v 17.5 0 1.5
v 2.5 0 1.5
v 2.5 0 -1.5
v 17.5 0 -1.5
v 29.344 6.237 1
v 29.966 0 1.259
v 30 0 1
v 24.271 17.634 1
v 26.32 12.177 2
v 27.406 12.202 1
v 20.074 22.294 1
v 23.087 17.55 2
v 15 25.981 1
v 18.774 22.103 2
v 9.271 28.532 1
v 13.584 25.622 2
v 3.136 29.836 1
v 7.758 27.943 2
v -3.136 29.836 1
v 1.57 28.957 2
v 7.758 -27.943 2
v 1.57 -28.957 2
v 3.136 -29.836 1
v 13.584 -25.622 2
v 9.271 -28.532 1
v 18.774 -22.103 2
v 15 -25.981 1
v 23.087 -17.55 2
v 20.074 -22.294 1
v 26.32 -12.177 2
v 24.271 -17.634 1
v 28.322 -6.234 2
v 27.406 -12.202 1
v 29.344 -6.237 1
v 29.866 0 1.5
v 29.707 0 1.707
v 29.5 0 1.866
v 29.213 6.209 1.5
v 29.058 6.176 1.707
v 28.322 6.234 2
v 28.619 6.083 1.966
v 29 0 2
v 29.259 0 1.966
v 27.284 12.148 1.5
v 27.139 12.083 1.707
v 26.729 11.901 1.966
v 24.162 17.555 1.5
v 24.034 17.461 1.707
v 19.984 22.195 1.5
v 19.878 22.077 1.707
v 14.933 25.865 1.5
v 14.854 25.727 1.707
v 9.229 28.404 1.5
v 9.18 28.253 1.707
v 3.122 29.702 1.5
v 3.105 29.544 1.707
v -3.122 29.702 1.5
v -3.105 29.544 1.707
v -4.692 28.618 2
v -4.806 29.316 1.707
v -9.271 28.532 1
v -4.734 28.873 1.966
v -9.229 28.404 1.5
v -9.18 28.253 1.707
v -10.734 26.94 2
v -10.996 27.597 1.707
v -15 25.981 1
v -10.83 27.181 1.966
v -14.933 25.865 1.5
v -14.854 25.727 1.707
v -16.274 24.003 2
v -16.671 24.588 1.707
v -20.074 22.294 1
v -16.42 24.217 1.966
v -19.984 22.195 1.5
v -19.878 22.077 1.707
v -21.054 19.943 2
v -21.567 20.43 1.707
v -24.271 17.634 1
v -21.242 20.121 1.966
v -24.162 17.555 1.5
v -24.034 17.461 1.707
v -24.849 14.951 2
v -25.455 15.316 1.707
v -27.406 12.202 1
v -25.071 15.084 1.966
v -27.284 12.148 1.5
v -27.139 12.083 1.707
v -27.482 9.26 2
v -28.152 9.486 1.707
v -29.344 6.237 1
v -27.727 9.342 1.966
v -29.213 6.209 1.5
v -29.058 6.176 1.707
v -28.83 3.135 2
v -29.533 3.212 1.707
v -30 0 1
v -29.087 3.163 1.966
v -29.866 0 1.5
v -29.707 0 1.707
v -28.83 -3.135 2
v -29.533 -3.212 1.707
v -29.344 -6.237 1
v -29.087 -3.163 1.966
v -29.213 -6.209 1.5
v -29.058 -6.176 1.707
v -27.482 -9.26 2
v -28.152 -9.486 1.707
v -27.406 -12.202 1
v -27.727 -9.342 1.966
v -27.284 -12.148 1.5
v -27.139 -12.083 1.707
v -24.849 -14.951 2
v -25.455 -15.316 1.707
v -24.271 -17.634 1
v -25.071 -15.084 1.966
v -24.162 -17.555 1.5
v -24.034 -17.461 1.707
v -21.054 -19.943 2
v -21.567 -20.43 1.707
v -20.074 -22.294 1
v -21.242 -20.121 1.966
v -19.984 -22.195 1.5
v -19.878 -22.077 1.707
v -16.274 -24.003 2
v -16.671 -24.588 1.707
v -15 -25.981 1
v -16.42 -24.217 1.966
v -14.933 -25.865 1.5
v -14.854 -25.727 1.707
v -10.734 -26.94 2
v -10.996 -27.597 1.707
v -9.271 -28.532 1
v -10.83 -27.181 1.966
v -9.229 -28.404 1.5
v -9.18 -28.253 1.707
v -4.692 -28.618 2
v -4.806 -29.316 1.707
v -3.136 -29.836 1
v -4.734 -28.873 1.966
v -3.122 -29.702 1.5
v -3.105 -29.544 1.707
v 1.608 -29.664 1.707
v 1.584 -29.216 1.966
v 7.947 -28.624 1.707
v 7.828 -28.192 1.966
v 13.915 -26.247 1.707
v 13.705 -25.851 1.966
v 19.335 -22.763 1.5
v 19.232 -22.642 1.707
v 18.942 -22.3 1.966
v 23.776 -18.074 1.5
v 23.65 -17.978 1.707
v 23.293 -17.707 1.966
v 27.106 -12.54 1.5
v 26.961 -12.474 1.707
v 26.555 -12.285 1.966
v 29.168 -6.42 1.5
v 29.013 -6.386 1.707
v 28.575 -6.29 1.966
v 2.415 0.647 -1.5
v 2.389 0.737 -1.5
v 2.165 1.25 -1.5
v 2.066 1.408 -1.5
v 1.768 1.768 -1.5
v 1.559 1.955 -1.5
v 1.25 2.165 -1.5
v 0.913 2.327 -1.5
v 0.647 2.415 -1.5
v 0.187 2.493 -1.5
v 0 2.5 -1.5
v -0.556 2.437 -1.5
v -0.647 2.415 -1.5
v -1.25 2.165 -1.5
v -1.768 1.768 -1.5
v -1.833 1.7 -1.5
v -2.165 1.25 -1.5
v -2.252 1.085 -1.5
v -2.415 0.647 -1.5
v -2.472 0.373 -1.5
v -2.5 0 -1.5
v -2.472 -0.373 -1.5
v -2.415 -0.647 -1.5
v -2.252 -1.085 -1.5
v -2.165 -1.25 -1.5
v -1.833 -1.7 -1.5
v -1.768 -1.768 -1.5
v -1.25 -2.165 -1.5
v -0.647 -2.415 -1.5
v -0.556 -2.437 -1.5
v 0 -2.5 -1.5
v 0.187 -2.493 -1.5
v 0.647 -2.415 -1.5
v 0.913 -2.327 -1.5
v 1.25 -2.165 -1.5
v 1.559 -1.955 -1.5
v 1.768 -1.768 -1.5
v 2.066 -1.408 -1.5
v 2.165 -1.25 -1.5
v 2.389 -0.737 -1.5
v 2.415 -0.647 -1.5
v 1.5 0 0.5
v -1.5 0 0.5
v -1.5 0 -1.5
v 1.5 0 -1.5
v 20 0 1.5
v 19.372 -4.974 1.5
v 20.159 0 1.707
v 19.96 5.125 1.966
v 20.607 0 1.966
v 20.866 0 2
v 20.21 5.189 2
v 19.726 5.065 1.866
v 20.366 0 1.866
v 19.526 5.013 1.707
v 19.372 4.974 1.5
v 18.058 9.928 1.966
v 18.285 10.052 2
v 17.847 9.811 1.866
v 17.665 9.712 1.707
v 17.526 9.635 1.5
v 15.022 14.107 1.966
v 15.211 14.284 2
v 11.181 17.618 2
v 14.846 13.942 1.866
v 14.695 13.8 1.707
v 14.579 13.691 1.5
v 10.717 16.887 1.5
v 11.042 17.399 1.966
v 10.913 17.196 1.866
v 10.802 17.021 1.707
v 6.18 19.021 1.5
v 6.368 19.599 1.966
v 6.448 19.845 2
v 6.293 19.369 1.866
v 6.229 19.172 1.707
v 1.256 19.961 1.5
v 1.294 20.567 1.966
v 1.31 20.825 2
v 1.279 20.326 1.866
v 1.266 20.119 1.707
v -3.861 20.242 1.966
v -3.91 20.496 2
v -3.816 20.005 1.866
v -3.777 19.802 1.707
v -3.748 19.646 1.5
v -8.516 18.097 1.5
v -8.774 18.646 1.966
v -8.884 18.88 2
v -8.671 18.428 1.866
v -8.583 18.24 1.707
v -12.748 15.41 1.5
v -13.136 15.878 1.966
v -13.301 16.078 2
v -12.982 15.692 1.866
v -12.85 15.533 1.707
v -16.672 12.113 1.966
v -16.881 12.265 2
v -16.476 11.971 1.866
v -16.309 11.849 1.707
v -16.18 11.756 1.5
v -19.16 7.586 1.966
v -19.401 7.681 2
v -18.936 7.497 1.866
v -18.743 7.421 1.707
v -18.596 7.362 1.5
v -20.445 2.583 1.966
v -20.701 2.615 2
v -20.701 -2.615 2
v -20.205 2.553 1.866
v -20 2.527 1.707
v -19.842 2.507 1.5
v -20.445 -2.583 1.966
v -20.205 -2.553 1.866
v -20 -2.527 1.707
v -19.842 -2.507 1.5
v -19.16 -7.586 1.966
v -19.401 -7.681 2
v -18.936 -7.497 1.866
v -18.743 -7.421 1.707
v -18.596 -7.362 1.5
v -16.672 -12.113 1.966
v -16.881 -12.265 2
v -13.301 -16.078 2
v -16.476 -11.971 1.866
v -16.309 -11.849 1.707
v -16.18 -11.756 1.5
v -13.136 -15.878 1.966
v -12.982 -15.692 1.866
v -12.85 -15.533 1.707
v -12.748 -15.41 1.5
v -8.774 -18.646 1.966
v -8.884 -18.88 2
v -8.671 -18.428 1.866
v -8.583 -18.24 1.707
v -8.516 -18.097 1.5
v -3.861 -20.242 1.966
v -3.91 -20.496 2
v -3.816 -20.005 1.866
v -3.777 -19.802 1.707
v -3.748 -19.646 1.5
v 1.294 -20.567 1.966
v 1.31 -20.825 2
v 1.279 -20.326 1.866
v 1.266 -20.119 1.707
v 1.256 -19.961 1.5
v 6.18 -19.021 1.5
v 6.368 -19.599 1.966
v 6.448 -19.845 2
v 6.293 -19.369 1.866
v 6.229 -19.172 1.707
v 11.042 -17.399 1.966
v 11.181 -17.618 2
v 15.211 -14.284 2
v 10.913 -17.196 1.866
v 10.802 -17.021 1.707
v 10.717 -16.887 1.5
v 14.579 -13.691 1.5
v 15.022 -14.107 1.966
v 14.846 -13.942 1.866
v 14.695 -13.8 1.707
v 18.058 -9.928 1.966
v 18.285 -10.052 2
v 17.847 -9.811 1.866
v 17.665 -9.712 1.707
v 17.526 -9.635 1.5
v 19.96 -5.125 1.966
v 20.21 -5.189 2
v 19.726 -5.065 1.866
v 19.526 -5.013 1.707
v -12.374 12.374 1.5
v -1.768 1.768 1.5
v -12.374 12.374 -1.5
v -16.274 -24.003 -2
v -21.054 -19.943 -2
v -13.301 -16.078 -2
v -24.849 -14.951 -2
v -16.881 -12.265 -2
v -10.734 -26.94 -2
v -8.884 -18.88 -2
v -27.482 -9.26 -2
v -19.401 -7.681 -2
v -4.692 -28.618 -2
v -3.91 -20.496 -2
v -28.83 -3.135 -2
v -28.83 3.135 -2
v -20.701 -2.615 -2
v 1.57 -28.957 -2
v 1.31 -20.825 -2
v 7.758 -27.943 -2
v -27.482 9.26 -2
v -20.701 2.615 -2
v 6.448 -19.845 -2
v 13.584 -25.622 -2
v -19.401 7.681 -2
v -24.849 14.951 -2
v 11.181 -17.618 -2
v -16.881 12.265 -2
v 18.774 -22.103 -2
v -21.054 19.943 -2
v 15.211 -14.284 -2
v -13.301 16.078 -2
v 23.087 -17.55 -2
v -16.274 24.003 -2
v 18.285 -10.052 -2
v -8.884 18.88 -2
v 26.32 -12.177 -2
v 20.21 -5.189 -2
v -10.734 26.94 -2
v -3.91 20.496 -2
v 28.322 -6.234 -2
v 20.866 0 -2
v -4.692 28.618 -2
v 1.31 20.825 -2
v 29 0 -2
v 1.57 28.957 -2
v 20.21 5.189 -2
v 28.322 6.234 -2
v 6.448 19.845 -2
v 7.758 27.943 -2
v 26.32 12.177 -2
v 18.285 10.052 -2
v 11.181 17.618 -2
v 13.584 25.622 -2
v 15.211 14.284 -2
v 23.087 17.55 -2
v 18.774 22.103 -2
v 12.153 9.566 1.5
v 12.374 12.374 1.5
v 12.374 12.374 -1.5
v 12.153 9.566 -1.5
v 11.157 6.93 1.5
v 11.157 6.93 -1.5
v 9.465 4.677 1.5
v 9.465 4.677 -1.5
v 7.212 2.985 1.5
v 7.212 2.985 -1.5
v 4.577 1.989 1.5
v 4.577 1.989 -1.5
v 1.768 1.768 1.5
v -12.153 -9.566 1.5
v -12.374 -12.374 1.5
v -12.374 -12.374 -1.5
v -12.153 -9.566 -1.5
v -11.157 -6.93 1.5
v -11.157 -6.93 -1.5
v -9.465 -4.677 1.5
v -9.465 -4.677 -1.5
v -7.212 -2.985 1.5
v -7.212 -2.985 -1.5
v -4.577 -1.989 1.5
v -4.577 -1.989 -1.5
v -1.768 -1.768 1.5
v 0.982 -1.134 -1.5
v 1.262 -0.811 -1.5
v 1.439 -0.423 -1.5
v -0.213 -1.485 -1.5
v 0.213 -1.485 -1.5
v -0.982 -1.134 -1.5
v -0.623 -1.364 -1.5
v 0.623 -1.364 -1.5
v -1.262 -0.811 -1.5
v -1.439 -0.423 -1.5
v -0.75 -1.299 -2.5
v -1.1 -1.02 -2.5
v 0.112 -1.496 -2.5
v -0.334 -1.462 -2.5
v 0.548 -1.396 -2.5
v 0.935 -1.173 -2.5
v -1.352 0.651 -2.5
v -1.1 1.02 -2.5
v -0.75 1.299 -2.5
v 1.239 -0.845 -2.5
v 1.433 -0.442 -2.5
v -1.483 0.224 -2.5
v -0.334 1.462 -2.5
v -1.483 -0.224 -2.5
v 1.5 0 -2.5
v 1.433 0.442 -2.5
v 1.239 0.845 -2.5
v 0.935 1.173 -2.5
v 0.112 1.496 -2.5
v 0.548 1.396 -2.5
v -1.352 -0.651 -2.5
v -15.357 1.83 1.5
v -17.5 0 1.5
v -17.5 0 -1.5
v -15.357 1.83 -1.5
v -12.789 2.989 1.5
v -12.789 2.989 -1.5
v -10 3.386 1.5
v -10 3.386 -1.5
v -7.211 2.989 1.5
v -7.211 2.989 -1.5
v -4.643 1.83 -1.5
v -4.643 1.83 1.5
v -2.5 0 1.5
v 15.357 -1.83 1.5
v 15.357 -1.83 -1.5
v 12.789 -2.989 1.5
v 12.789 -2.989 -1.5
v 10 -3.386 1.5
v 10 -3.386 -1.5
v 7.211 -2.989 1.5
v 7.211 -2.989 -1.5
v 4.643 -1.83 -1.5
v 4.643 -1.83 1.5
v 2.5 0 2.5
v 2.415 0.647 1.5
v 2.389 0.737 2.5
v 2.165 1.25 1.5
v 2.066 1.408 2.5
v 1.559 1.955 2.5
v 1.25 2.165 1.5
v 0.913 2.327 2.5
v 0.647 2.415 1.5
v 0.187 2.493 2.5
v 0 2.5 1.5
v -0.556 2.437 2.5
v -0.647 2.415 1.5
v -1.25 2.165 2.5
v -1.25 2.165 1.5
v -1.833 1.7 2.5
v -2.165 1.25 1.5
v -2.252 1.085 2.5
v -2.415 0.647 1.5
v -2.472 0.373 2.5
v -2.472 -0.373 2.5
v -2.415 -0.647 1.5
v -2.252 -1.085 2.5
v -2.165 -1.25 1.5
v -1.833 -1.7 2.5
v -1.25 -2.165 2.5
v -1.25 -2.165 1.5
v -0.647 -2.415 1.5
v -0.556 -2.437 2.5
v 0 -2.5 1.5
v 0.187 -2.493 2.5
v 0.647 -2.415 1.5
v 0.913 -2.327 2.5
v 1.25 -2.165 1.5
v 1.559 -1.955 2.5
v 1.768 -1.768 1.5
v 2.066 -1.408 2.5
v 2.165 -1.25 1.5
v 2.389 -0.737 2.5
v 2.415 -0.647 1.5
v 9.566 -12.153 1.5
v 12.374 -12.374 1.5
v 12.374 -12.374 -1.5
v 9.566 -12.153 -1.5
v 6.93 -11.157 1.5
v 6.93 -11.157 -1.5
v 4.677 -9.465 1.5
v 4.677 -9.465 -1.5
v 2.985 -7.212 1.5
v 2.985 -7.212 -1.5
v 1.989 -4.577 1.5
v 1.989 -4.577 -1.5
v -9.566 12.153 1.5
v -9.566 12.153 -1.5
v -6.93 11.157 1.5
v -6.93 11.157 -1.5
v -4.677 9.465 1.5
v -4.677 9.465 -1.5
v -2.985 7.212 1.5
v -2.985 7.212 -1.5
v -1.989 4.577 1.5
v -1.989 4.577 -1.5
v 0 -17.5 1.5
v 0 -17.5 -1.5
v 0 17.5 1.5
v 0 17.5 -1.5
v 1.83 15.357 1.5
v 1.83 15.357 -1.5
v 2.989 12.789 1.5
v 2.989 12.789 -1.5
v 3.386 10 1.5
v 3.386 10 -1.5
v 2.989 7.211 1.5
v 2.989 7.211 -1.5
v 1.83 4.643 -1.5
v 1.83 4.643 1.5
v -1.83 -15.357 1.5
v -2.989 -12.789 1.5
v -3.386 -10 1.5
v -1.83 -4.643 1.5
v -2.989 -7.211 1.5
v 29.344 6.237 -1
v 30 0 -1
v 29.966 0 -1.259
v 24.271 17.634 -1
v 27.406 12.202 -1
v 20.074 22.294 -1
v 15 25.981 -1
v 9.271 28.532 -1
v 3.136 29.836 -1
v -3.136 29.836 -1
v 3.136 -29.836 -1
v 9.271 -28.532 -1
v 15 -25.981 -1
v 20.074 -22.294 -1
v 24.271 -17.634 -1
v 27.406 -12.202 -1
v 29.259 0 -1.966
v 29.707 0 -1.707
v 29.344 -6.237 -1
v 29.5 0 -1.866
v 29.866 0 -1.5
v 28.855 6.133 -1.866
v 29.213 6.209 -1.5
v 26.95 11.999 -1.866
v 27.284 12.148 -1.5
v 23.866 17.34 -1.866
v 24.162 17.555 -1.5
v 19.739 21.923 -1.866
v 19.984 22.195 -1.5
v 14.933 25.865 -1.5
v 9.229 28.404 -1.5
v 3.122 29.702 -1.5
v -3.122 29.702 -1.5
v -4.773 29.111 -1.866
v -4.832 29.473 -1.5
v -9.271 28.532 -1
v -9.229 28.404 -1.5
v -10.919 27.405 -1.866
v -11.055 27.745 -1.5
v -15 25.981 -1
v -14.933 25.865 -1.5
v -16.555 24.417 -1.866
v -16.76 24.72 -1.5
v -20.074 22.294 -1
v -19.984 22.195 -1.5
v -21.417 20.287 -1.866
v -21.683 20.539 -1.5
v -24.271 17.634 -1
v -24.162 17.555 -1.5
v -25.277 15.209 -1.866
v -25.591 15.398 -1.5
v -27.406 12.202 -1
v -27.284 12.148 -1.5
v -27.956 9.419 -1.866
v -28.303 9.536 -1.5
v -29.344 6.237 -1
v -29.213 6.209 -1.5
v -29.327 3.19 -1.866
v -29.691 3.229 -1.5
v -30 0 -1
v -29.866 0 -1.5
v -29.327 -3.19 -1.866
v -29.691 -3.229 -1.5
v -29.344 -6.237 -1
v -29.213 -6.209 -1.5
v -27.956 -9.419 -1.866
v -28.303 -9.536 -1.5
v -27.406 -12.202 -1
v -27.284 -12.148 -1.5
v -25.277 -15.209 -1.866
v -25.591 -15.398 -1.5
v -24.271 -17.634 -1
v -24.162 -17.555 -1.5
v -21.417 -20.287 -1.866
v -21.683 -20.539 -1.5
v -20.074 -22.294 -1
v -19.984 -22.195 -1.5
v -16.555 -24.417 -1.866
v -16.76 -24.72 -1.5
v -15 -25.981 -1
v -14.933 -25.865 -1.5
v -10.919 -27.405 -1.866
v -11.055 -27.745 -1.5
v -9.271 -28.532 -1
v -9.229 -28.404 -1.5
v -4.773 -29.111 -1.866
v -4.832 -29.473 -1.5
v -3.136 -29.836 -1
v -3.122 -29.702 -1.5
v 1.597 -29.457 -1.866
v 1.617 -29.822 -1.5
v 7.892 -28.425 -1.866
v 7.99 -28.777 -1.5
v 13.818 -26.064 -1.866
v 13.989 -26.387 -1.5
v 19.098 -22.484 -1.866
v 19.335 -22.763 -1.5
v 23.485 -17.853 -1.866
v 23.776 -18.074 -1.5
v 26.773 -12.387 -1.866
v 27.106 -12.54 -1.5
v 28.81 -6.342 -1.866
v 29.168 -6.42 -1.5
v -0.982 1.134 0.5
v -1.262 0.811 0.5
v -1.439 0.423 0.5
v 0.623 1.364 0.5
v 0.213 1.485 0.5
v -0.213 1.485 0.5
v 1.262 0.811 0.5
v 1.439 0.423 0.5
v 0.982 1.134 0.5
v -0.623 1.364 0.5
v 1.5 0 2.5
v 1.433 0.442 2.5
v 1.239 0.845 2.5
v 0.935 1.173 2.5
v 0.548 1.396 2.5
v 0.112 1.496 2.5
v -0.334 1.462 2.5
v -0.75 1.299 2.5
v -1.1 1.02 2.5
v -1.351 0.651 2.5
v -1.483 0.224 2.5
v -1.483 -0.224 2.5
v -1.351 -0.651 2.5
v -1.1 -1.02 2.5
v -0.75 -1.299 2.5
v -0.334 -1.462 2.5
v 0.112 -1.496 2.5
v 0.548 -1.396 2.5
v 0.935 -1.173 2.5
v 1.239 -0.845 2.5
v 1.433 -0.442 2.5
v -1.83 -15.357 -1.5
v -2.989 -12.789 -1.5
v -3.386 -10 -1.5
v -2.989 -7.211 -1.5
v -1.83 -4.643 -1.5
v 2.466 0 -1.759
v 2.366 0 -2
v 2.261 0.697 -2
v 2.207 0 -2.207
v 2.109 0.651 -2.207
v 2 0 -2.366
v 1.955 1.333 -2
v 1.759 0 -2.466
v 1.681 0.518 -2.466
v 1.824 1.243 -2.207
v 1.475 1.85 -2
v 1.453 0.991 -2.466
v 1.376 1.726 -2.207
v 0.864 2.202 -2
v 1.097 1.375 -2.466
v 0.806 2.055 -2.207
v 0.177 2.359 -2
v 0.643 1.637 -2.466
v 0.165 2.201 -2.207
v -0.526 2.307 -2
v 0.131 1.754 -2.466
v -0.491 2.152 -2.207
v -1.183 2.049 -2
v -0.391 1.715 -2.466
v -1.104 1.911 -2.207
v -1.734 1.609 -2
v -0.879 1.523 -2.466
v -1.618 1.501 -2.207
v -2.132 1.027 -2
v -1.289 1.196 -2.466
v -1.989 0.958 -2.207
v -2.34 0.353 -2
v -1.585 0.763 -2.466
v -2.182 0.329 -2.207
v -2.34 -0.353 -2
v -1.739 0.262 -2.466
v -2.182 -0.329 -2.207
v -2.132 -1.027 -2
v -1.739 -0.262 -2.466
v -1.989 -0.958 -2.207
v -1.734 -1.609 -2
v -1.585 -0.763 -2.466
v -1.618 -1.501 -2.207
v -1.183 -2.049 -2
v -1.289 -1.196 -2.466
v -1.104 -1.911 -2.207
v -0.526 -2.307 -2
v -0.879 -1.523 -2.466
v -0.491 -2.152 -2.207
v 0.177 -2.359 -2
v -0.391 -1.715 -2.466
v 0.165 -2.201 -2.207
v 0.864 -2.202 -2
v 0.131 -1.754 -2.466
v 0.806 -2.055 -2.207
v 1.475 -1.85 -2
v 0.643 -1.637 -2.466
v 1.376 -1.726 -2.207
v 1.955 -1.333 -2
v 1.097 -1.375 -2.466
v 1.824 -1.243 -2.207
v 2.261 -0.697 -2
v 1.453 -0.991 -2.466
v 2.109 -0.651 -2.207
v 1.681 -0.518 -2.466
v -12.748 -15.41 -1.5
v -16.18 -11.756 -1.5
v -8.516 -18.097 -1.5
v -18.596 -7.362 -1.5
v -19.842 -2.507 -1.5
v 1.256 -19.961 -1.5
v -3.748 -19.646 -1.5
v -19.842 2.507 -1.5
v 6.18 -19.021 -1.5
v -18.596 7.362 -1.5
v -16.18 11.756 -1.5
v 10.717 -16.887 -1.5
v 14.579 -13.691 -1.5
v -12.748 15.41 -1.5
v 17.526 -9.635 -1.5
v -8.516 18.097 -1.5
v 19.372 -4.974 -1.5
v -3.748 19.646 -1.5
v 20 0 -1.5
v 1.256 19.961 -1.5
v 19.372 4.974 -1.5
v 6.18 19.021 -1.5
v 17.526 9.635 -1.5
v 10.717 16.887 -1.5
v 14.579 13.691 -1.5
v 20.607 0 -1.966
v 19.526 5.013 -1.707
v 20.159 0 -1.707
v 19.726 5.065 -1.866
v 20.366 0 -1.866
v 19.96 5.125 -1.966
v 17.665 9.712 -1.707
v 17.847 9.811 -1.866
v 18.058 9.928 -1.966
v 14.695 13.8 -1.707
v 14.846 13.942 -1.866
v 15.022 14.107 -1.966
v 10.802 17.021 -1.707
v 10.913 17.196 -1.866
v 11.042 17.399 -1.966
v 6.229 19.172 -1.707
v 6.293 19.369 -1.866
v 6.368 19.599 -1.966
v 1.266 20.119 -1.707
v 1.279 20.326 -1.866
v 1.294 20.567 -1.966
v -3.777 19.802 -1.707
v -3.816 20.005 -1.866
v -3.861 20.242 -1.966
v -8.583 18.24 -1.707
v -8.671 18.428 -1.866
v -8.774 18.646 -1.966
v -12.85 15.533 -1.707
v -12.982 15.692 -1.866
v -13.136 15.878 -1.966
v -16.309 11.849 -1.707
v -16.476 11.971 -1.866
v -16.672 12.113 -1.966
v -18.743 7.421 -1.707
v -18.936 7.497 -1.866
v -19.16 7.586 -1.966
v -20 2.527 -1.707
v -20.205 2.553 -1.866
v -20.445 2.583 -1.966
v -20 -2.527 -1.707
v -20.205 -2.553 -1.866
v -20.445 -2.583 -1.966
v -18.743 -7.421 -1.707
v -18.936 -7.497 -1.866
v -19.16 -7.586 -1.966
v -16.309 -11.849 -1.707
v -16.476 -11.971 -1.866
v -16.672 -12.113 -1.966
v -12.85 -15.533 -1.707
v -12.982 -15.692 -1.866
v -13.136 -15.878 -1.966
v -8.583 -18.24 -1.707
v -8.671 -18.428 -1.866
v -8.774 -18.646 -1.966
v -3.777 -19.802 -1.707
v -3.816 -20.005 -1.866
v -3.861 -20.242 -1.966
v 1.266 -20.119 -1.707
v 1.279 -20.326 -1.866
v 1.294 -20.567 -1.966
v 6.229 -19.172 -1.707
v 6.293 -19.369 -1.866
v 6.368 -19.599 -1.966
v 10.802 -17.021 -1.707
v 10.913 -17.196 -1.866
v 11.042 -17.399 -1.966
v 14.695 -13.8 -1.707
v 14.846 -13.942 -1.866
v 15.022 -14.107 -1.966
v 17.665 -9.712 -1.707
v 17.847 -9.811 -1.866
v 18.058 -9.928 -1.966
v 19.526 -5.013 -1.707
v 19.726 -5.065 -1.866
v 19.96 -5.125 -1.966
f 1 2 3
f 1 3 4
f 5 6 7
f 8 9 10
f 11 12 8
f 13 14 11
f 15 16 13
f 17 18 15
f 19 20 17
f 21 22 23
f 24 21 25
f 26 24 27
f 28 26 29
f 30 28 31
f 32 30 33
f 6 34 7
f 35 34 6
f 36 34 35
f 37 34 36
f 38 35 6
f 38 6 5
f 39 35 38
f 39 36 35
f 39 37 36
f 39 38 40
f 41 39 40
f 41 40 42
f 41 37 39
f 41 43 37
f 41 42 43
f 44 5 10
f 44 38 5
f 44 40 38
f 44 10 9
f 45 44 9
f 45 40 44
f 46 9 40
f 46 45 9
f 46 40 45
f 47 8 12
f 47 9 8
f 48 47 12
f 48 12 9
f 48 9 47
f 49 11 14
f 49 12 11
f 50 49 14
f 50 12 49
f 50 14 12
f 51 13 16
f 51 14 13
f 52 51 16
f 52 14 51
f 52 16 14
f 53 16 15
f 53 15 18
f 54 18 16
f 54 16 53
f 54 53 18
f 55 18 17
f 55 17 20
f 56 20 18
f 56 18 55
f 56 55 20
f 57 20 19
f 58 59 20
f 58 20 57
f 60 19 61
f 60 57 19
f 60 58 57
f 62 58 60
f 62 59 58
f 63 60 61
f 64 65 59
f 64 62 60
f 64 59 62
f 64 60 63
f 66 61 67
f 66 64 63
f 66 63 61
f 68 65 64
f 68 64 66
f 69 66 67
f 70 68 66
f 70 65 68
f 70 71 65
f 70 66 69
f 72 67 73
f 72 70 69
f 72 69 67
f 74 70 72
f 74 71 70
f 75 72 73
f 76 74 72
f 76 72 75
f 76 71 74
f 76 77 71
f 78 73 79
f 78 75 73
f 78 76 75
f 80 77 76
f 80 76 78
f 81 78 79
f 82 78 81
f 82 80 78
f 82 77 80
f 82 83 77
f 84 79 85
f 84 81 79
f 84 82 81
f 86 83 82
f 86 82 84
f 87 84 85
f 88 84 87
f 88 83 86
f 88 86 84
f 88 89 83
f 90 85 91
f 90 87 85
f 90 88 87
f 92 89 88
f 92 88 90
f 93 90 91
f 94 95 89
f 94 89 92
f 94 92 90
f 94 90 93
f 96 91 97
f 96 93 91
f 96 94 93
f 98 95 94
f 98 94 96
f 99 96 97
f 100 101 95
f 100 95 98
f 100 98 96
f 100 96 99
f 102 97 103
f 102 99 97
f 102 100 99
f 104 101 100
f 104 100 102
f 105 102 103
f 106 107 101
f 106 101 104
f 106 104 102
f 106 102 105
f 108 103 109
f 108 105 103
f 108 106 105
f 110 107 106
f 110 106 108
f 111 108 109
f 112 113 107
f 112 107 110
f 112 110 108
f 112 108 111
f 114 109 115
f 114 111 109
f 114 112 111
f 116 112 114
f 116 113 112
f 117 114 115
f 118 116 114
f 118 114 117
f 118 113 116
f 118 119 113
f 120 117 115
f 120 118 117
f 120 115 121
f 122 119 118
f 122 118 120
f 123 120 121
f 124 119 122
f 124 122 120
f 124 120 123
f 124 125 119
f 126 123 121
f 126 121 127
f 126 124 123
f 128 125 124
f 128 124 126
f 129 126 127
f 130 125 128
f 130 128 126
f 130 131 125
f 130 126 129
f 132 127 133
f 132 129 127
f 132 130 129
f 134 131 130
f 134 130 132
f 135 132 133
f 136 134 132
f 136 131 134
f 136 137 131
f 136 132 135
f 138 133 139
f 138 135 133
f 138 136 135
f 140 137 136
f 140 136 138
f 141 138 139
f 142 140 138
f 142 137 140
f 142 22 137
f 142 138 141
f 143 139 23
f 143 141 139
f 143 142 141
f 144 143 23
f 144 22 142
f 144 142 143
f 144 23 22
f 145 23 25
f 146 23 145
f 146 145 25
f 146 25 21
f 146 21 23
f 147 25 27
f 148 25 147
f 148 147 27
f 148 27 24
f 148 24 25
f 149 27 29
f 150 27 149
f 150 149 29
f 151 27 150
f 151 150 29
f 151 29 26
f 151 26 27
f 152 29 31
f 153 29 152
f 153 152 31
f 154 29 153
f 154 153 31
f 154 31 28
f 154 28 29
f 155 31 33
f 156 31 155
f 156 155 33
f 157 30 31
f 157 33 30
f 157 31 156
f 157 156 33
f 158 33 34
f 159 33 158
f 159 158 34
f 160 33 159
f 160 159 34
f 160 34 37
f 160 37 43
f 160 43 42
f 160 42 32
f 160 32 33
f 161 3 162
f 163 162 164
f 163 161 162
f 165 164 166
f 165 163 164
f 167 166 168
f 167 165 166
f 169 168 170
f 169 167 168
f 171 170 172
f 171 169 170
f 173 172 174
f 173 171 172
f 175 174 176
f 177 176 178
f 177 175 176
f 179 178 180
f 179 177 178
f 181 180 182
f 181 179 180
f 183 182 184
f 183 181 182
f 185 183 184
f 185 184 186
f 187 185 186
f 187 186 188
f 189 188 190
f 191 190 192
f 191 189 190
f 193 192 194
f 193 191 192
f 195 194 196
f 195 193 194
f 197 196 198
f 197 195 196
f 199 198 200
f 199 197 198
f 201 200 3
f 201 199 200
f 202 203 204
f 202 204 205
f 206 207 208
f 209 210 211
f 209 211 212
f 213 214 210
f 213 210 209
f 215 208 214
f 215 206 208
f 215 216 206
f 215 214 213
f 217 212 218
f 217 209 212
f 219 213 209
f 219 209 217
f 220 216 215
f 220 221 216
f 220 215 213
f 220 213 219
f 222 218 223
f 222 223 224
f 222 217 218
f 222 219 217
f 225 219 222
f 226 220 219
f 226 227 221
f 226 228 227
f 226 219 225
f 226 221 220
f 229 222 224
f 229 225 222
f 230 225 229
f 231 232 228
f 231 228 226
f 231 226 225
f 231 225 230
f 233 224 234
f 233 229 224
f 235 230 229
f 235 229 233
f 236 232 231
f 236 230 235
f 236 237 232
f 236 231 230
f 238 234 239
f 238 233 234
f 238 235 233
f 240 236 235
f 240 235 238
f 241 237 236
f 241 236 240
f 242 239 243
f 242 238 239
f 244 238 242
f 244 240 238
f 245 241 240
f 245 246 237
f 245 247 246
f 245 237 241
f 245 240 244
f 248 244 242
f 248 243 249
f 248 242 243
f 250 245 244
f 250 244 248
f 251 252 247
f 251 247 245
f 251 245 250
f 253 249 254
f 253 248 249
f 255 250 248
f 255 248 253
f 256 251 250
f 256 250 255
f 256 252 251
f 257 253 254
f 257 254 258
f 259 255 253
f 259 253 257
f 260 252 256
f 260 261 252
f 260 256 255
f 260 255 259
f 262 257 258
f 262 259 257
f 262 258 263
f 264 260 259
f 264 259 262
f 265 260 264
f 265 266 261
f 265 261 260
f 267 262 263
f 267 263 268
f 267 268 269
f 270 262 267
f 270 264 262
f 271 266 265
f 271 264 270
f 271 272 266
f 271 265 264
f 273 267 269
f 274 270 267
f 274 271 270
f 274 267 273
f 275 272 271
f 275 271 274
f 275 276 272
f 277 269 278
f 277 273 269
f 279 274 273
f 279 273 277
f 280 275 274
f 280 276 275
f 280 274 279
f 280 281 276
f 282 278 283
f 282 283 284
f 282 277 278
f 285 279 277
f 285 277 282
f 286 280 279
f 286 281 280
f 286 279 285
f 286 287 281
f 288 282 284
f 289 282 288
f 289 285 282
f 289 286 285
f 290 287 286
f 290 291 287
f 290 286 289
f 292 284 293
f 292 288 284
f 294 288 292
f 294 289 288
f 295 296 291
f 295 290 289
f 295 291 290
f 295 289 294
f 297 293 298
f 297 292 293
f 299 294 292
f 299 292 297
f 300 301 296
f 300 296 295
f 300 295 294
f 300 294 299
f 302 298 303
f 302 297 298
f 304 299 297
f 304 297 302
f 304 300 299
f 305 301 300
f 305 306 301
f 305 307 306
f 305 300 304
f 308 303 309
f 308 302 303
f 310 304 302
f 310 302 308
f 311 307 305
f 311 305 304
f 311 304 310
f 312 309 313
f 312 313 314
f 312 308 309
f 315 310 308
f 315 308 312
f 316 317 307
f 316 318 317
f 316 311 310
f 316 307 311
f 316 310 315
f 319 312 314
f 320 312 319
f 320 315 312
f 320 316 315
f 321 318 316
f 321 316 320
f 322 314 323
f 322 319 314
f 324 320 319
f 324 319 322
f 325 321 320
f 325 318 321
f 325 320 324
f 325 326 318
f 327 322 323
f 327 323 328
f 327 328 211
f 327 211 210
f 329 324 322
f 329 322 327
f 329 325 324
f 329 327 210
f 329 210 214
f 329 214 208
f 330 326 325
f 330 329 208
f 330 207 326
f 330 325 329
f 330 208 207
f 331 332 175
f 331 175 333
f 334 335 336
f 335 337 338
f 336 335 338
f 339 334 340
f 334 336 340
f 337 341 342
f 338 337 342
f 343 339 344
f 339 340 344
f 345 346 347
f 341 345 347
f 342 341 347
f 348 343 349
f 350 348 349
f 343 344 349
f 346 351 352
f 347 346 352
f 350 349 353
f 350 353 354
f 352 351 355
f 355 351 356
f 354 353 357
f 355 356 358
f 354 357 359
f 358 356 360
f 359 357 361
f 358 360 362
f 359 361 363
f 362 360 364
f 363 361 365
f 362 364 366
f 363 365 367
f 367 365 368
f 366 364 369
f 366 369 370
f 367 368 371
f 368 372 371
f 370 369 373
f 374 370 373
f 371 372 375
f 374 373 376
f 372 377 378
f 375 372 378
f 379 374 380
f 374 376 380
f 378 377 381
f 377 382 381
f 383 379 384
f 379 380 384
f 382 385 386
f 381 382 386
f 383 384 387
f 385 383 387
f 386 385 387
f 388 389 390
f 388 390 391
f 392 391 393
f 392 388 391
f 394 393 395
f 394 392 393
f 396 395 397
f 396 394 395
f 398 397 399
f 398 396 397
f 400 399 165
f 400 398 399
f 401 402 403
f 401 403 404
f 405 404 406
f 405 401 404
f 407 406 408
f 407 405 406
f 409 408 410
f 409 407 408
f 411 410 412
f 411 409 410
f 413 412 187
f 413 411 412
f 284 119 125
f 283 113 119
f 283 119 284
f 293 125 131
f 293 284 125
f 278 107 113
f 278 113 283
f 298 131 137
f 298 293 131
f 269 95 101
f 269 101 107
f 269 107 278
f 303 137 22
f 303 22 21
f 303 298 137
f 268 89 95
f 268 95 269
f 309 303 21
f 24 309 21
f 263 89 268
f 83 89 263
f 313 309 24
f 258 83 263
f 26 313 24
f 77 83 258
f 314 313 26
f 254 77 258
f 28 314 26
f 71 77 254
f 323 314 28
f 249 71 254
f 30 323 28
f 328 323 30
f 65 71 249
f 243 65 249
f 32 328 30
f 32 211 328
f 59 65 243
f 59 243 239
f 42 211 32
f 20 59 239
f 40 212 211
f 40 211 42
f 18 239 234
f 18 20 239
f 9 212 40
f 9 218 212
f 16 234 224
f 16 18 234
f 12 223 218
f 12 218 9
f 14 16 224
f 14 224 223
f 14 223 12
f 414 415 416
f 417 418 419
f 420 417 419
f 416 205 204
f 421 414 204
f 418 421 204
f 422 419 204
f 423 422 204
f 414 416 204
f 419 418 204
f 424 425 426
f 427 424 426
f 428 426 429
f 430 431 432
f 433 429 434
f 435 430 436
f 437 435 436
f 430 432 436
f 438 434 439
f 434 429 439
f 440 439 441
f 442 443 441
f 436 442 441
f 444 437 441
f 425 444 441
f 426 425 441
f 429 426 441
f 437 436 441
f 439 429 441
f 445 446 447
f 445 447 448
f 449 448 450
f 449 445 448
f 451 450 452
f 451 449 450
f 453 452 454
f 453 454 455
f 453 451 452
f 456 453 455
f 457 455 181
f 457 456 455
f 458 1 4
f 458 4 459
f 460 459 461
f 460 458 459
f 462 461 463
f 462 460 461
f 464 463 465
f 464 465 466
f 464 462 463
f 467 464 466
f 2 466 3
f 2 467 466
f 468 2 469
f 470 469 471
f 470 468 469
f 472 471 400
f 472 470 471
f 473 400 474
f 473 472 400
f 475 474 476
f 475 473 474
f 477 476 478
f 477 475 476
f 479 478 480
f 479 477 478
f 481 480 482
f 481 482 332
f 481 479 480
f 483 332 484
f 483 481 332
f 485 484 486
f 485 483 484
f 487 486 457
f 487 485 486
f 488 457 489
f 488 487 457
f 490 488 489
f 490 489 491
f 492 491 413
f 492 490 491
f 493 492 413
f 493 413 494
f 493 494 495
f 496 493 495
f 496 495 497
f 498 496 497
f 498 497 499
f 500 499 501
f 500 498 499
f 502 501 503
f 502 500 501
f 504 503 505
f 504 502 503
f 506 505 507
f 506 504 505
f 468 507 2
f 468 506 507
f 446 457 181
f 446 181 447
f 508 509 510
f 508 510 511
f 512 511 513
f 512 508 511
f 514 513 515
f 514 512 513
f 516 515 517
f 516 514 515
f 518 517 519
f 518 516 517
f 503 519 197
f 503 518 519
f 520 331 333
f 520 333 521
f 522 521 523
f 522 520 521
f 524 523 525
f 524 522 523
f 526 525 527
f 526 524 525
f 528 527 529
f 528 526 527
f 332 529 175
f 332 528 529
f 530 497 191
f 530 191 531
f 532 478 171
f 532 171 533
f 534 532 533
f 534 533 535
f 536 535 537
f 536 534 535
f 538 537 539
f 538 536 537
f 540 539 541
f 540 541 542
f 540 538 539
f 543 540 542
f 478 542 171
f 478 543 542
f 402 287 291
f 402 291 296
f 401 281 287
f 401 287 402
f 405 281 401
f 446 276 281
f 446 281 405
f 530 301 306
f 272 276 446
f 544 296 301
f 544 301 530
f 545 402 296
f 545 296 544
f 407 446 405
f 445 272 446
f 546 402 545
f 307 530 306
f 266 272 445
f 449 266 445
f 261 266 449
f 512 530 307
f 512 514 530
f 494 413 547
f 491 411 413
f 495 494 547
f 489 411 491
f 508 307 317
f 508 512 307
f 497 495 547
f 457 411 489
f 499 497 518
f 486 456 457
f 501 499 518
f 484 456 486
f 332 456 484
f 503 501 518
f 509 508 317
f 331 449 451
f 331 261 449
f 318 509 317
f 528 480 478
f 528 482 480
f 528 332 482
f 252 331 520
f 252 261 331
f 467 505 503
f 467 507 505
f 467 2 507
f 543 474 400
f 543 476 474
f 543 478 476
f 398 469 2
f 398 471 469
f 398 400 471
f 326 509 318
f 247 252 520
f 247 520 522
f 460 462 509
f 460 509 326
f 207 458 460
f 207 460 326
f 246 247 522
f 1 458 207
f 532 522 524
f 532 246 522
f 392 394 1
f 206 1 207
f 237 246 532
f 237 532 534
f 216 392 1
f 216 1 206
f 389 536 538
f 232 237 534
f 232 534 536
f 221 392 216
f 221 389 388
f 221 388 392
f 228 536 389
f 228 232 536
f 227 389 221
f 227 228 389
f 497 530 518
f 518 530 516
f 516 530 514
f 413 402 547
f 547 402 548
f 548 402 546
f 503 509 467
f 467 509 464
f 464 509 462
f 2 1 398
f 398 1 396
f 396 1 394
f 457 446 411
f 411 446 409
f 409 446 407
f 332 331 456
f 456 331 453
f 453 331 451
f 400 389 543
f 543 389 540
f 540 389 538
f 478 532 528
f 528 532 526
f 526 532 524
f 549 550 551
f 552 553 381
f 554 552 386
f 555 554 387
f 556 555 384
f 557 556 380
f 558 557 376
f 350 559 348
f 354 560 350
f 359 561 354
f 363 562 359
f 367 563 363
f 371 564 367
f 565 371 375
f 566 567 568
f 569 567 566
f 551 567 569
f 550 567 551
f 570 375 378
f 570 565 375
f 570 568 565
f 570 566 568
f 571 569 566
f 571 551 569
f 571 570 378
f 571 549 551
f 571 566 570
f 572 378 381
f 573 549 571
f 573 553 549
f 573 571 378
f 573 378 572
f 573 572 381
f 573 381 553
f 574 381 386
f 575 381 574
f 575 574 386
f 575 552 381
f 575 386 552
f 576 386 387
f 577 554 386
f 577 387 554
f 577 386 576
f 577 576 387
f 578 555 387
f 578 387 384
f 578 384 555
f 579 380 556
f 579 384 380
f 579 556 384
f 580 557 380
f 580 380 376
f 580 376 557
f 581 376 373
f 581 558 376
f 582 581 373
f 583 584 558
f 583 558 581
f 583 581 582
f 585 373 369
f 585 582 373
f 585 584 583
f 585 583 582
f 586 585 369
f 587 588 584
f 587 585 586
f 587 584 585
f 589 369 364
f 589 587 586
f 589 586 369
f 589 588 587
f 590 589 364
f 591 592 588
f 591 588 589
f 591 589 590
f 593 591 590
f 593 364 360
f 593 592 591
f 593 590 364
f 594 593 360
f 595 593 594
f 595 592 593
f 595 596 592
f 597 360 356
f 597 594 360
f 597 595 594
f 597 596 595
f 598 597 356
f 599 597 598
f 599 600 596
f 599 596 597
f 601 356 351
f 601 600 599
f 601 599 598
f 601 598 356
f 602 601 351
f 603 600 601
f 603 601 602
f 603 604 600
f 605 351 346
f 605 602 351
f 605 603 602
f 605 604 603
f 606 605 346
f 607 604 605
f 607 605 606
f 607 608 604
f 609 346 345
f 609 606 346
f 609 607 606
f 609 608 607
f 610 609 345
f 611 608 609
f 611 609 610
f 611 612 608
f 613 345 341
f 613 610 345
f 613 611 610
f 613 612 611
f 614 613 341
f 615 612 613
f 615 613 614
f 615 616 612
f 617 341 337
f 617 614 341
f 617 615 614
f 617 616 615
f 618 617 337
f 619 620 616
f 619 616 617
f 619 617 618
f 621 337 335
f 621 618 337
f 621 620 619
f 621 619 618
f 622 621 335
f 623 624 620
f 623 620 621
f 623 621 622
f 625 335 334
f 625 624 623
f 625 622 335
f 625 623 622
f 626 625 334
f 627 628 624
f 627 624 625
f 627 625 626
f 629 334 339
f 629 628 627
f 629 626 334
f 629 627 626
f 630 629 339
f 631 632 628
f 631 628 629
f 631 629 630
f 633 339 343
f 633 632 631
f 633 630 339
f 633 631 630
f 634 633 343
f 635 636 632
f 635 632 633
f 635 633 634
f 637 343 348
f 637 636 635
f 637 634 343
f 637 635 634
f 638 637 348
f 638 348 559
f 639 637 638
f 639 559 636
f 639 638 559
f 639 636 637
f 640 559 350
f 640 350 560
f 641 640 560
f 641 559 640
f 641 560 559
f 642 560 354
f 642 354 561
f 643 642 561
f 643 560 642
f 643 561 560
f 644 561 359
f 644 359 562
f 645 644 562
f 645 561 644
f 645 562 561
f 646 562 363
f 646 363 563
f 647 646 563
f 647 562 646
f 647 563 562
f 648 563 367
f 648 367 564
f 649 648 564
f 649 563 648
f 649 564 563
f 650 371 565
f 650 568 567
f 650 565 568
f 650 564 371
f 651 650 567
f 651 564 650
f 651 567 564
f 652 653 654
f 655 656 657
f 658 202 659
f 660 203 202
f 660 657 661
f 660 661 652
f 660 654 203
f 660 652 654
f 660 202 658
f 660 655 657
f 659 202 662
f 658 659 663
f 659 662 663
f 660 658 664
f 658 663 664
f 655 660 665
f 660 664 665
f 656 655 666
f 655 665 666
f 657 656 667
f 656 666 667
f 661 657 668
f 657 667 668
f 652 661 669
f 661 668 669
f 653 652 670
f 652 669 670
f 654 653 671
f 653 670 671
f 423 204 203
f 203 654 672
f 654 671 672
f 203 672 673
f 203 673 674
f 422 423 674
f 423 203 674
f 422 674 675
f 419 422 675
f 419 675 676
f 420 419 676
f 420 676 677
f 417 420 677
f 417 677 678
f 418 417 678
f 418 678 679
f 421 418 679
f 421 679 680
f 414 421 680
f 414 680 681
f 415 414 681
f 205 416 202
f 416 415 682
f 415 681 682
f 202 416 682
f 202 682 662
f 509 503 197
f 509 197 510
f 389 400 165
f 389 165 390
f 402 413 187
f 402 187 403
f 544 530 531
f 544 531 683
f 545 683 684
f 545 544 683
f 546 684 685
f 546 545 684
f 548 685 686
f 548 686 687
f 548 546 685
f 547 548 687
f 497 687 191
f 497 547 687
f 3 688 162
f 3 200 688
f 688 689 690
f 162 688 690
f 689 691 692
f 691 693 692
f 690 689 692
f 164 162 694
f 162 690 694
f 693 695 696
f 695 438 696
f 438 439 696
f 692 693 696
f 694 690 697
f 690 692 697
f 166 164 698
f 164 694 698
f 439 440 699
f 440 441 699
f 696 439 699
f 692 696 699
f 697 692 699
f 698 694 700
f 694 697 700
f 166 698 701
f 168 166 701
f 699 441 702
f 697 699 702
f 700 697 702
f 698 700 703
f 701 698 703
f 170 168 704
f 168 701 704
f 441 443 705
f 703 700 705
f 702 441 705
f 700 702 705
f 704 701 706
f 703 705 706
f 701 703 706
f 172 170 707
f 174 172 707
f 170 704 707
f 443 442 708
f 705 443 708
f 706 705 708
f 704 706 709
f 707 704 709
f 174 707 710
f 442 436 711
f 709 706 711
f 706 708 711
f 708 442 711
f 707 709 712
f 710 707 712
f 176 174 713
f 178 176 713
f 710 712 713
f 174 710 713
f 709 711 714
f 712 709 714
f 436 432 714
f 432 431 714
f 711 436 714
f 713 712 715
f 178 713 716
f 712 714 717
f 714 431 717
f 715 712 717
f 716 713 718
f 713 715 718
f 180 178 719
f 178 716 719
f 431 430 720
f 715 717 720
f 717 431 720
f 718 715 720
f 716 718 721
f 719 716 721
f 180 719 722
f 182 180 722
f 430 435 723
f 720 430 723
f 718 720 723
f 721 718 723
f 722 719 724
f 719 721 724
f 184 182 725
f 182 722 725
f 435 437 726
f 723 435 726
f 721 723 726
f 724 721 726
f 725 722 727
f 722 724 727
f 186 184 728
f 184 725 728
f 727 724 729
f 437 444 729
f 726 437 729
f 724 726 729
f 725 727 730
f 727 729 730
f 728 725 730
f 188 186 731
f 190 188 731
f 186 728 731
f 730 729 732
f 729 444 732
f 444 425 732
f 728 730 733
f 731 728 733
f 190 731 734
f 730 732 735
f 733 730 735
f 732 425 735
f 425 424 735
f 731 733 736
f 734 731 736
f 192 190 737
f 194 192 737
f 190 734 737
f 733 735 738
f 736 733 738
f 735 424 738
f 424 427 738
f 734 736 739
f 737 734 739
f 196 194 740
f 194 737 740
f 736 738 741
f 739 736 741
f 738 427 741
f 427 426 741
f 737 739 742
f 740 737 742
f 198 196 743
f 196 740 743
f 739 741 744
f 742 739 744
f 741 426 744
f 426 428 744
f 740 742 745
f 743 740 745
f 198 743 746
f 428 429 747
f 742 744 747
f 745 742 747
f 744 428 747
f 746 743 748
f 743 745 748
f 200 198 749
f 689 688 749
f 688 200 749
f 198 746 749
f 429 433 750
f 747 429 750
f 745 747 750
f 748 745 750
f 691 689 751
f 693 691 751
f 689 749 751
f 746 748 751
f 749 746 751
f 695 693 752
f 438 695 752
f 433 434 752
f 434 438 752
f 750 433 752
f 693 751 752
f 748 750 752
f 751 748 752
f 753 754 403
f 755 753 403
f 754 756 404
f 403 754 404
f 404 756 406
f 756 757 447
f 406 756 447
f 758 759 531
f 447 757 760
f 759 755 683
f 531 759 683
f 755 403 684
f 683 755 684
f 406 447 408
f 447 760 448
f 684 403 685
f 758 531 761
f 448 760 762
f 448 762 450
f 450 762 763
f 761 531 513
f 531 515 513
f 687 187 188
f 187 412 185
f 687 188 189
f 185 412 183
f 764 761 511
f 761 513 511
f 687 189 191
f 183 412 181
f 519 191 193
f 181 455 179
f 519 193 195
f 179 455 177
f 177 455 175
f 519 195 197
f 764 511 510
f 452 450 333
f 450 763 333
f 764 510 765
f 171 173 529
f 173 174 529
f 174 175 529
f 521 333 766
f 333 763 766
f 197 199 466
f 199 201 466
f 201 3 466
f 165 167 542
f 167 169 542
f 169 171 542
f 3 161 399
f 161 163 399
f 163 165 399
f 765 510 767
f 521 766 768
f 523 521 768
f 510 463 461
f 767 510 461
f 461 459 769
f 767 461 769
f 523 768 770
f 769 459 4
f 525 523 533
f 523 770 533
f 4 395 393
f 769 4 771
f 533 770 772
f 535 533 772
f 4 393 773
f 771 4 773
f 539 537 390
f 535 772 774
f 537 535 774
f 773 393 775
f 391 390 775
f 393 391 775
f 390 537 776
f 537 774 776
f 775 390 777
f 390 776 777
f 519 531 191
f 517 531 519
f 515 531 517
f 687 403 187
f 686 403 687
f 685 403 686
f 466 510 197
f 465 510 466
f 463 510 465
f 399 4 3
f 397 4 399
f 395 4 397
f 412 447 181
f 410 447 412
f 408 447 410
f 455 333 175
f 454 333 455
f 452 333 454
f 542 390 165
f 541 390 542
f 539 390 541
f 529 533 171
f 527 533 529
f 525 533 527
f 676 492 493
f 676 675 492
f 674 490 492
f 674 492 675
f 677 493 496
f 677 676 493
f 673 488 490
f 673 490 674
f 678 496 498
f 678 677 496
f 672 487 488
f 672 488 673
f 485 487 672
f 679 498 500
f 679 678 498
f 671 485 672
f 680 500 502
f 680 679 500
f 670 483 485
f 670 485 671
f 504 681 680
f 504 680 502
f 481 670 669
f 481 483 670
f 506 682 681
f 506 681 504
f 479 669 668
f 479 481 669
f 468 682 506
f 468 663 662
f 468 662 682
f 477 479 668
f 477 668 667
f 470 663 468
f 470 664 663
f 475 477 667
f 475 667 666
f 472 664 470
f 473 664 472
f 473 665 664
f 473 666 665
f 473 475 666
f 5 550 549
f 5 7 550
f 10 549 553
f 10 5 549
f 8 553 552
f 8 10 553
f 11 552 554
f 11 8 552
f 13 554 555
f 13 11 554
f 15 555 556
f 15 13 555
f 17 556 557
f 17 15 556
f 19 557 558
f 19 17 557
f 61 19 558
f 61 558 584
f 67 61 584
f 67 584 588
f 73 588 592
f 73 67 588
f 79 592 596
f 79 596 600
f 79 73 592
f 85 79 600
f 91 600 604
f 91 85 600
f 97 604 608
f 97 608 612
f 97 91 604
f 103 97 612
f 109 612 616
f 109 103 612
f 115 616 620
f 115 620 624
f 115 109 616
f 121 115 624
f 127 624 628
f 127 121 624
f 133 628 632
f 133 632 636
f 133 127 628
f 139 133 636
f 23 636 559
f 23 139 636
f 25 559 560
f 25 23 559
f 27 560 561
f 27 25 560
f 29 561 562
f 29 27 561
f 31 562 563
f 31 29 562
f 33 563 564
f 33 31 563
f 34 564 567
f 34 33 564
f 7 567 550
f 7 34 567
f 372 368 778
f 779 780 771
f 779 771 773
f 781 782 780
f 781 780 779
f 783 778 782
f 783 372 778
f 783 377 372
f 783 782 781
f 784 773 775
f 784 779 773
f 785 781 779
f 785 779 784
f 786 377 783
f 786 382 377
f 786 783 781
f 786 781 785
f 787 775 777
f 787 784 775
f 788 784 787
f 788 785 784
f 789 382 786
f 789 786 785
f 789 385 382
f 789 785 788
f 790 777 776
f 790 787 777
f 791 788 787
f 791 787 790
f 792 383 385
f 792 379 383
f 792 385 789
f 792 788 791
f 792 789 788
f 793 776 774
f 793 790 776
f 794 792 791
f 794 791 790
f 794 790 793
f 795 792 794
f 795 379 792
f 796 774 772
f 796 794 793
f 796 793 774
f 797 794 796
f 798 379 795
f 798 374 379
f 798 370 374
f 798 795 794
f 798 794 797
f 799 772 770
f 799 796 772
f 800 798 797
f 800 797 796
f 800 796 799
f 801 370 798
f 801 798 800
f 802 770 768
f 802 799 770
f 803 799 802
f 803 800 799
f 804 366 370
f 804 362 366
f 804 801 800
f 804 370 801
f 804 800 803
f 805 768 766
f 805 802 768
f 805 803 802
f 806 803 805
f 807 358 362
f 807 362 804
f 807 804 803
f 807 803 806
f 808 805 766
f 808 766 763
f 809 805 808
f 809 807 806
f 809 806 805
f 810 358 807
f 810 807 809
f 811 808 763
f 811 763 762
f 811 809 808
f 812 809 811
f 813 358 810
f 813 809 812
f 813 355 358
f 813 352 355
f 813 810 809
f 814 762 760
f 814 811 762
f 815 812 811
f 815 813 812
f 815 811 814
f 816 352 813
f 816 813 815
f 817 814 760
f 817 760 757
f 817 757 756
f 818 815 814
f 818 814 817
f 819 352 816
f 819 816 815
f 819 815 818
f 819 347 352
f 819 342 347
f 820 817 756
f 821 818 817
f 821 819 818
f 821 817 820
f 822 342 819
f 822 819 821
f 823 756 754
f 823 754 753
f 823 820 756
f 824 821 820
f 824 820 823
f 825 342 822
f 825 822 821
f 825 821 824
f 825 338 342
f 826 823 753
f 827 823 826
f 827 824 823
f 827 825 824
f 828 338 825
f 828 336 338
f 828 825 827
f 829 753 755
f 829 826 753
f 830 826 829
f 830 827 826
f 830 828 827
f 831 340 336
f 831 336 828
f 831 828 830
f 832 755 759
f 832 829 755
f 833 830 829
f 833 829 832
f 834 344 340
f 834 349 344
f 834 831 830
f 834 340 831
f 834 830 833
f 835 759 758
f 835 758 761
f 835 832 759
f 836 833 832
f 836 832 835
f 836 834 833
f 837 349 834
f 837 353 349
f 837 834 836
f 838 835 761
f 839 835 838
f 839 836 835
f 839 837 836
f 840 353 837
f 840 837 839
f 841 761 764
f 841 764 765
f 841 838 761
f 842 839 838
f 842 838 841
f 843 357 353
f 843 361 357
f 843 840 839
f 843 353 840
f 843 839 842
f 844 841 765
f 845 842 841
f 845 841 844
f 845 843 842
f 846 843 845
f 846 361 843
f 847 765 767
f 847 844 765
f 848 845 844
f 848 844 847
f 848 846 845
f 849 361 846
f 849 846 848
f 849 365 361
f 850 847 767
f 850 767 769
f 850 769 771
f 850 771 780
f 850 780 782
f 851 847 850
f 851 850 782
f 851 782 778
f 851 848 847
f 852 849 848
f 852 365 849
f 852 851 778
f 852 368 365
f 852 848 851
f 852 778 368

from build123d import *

# Parameters (mm, degrees)
SKETCH1_R           = 2.5
BOSS_EXTRUDE5_DEPTH = 2.5
SKETCH7_R           = 20
BOSS_EXTRUDE6_DEPTH = 1.5
CUT_EXTRUDE5_DEPTH  = 3
SKETCH9_R           = 30
SKETCH9_R_2         = 20
BOSS_EXTRUDE8_DEPTH = 2
SKETCH10_R          = 1.5
CUT_EXTRUDE6_DEPTH  = 2
CUT_EXTRUDE7_DEPTH  = 2
FILLET1_R           = 1
FILLET2_R           = 1


# Some blends are built 0.0001 mm under size
with BuildPart() as part:
    # Sketch1 → Boss-Extrude5 (new, symmetric)
    with BuildSketch(Plane.XY):
        Circle(SKETCH1_R)
    extrude(amount=BOSS_EXTRUDE5_DEPTH, both=True)

    # Sketch7 → Boss-Extrude6 (add, symmetric)
    with BuildSketch(Plane.XY):
        Circle(SKETCH7_R)
    extrude(amount=BOSS_EXTRUDE6_DEPTH, both=True)

    # Sketch8 → Cut-Extrude5 (cut)
    with BuildSketch(Plane.XY.offset(1.5)):
        with BuildLine():
            Line((0, 2.5), (0, 17.5))
            ThreePointArc((0, 17.5), (3.385621722, 10), (0, 2.5))
        make_face()
        with BuildLine():
            Line((1.767766953, 1.767766953), (12.374368671, 12.374368671))
            ThreePointArc((12.374368671, 12.374368671), (9.46506389, 4.677071733), (1.767766953, 1.767766953))
        make_face()
        with BuildLine():
            Line((2.5, 0), (17.5, 0))
            ThreePointArc((17.5, 0), (10, -3.385621722), (2.5, 0))
        make_face()
        with BuildLine():
            Line((1.767766953, -1.767766953), (12.374368671, -12.374368671))
            ThreePointArc((12.374368671, -12.374368671), (4.677071733, -9.46506389), (1.767766953, -1.767766953))
        make_face()
        with BuildLine():
            Line((0, -2.5), (0, -17.5))
            ThreePointArc((0, -17.5), (-3.385621722, -10), (0, -2.5))
        make_face()
        with BuildLine():
            Line((-1.767766953, -1.767766953), (-12.374368671, -12.374368671))
            ThreePointArc((-12.374368671, -12.374368671), (-9.46506389, -4.677071733), (-1.767766953, -1.767766953))
        make_face()
        with BuildLine():
            Line((-2.5, 0), (-17.5, 0))
            ThreePointArc((-17.5, 0), (-10, 3.385621722), (-2.5, 0))
        make_face()
        with BuildLine():
            Line((-1.767766953, 1.767766953), (-12.374368671, 12.374368671))
            ThreePointArc((-12.374368671, 12.374368671), (-4.677071733, 9.46506389), (-1.767766953, 1.767766953))
        make_face()
    extrude(amount=-CUT_EXTRUDE5_DEPTH, mode=Mode.SUBTRACT)

    # Sketch9 → Boss-Extrude8 (add, symmetric)
    with BuildSketch(Plane.XY):
        Circle(SKETCH9_R)
        Circle(SKETCH9_R_2, mode=Mode.SUBTRACT)
    extrude(amount=BOSS_EXTRUDE8_DEPTH, both=True)

    # Sketch10 → Cut-Extrude6 (cut)
    with BuildSketch(Plane.XY.offset(2.5)):
        Circle(SKETCH10_R)
    extrude(amount=-CUT_EXTRUDE6_DEPTH, mode=Mode.SUBTRACT)

    # Sketch11 → Cut-Extrude7 (cut)
    with BuildSketch(Plane.XY.offset(0.5)):
        with BuildLine():
            Line((-1.5, 0), (1.5, 0))
            ThreePointArc((1.5, 0), (0, -1.5), (-1.5, 0))
        make_face()
    extrude(amount=-CUT_EXTRUDE7_DEPTH, mode=Mode.SUBTRACT)

    # Fillet1
    fillet1_edges = [part.edges().sort_by_distance(p)[0] for p in [
        (-2.5, 0, -2.5),
    ]]
    fillet(fillet1_edges, radius=FILLET1_R - 0.0001)  # a hair under: the kernel refuses the full size

    # Fillet2
    # the kernel refuses this fillet: 1 mm, written as the material it takes off along each edge
    with BuildSketch(Plane(origin=(0, 0, 2), x_dir=(1, 0, 0), z_dir=(0, -1, 0))) as fillet2_piece_1:
        with BuildLine():
            CenterArc((30 - FILLET2_R, -FILLET2_R), FILLET2_R, 0, 90)
            Line((30 - FILLET2_R, 0), (30 - FILLET2_R, FILLET2_R * 0.02))
            Line((30 - FILLET2_R, FILLET2_R * 0.02), (30 + FILLET2_R * 0.02, FILLET2_R * 0.02))
            Line((30 + FILLET2_R * 0.02, FILLET2_R * 0.02), (30 + FILLET2_R * 0.02, -FILLET2_R))
            Line((30 + FILLET2_R * 0.02, -FILLET2_R), (30, -FILLET2_R))
        make_face()
    revolve(axis=Axis((0, 0, 2), (0, 0, 1)), mode=Mode.SUBTRACT)
    with BuildSketch(Plane(origin=(0, 0, -2), x_dir=(1, 0, 0), z_dir=(0, -1, 0))) as fillet2_piece_2:
        with BuildLine():
            CenterArc((20.866025404, 1), FILLET2_R, 210, 60)
            Line((20.866025404, 0), (20.866025404, -0.02))
            Line((20.866025404, -0.02), (20, -0.02))
            Line((20, -0.02), (19.98, 0))
            ThreePointArc((19.98, 0), (19.98, 0.25), (19.982679492, 0.49))
            Line((19.982679492, 0.49), (20, 0.5))
        make_face()
    revolve(axis=Axis((0, 0, -2), (0, 0, 1)), mode=Mode.SUBTRACT)
    with BuildSketch(Plane(origin=(0, 0, -2), x_dir=(1, 0, 0), z_dir=(0, -1, 0))) as fillet2_piece_3:
        with BuildLine():
            CenterArc((30 - FILLET2_R, FILLET2_R), FILLET2_R, 270, 90)
            Line((30, FILLET2_R), (30 + FILLET2_R * 0.02, FILLET2_R))
            Line((30 + FILLET2_R * 0.02, FILLET2_R), (30 + FILLET2_R * 0.02, -FILLET2_R * 0.02))
            Line((30 + FILLET2_R * 0.02, -FILLET2_R * 0.02), (30 - FILLET2_R, -FILLET2_R * 0.02))
            Line((30 - FILLET2_R, -FILLET2_R * 0.02), (30 - FILLET2_R, 0))
        make_face()
    revolve(axis=Axis((0, 0, -2), (0, 0, 1)), mode=Mode.SUBTRACT)
    with BuildSketch(Plane(origin=(0, 0, 2), x_dir=(1, 0, 0), z_dir=(0, -1, 0))) as fillet2_piece_4:
        with BuildLine():
            CenterArc((20.866025404, -1), FILLET2_R, 90, 60)
            Line((20.866025404, 0), (20.866025404, 0.02))
            Line((20.866025404, 0.02), (20, 0.02))
            Line((20, 0.02), (19.98, 0))
            ThreePointArc((19.98, 0), (19.98, -0.25), (19.982679492, -0.49))
            Line((19.982679492, -0.49), (20, -0.5))
        make_face()
    revolve(axis=Axis((0, 0, 2), (0, 0, 1)), mode=Mode.SUBTRACT)


solid = part.part
